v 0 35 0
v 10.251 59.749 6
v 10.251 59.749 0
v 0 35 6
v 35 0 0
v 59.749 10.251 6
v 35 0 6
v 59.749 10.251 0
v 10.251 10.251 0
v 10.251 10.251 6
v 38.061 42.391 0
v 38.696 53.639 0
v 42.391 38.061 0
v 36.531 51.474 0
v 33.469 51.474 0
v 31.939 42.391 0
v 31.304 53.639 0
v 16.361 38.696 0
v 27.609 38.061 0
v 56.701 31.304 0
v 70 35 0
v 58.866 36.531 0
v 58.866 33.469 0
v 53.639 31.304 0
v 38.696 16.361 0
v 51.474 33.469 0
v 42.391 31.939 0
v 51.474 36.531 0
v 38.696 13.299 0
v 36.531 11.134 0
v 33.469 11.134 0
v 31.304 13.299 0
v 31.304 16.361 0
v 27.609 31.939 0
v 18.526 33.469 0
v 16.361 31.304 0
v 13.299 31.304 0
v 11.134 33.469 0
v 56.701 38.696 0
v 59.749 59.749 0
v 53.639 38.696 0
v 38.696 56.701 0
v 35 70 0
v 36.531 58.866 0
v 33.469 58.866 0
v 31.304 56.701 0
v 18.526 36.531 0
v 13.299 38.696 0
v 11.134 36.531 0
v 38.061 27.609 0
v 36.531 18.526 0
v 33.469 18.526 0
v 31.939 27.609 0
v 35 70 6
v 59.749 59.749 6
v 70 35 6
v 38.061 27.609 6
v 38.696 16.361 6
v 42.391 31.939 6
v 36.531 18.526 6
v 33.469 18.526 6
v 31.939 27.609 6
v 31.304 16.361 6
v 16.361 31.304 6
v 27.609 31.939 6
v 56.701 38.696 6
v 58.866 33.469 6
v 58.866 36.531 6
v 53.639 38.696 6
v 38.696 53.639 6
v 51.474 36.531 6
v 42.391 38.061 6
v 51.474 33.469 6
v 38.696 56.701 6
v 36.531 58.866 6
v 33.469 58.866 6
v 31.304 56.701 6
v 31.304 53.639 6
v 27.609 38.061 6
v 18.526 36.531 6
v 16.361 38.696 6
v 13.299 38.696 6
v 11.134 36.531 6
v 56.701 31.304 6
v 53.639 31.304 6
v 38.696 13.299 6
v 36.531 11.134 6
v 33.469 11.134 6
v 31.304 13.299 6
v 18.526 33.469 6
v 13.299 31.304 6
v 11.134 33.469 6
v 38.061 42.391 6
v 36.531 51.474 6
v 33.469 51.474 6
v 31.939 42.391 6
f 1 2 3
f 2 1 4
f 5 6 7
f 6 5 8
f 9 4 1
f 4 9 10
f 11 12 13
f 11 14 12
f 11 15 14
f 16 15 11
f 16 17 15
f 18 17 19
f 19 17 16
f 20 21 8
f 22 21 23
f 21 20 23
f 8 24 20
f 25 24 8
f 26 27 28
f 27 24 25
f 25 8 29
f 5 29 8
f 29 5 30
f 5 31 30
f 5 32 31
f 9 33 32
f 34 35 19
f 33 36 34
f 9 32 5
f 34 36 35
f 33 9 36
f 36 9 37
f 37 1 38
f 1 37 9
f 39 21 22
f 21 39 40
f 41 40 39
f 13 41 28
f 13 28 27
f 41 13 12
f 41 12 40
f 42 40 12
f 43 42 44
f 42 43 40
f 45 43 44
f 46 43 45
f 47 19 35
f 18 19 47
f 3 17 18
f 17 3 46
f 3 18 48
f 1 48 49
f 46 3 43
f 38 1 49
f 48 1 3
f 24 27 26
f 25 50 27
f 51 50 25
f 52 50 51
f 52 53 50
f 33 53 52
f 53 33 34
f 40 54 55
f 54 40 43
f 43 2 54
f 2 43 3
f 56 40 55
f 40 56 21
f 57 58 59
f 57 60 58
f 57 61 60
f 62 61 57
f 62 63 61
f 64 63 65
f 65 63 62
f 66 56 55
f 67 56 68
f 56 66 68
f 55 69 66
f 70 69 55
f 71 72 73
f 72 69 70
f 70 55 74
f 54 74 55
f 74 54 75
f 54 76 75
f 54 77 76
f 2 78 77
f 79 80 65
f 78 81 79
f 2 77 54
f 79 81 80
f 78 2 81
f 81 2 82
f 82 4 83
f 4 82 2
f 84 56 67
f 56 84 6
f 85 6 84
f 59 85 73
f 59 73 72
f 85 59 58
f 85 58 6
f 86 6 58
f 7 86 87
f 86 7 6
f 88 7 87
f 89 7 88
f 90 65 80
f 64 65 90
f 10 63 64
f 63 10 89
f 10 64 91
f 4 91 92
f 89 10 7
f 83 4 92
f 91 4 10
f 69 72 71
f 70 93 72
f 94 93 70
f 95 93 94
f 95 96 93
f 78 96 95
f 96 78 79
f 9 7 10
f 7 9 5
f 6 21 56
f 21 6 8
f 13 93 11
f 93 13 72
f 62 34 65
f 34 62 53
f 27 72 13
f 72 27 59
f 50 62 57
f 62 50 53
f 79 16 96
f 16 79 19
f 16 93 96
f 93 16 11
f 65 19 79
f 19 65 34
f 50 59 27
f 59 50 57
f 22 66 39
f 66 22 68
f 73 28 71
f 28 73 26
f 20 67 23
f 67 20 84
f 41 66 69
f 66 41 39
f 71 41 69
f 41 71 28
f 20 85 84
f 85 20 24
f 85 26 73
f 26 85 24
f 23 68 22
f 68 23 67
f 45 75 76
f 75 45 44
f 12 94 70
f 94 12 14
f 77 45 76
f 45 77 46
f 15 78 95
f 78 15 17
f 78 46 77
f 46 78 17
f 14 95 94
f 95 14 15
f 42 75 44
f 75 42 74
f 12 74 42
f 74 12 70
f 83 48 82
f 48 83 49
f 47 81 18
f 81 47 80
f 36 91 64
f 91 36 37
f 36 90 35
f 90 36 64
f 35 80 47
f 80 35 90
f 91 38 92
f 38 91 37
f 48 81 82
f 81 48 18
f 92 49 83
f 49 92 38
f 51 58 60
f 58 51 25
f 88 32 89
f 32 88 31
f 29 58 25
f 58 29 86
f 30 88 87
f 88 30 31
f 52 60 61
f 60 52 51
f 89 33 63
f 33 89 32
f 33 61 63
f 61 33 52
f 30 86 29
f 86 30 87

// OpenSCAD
$fn = 32;

// ----------------------------------------------------------------------
// Polygon plate: 8-gon R35, 4 bolt windows
// ----------------------------------------------------------------------

// --- parameters (mm) ---
sides = 8;                // number of polygon sides
plate_r = 35;             // circumscribed radius of the polygon
bore_r = 8;               // centre bore radius
bolts = 4;                // number of bolt windows
ring_r = 20.17;           // bolt-circle radius
bolt_r = 4;               // bolt window radius
plate_t = 6;              // plate thickness, Z (extrusion height)

plate_d = 2 * plate_r;  // circumscribed diameter
bore_d = 2 * bore_r;  // centre bore diameter
bolt_d = 2 * bolt_r;  // bolt window diameter
ring_d = 2 * ring_r;  // bolt-circle diameter

profile = [[70, 35], [59.749, 59.749], [35, 70], [10.251, 59.749], [0, 35], [10.251, 10.251], [35, 0], [59.749, 10.251]];  // primary outline, 8 points, counter clockwise
void_1 = [[42.391, 38.061], [38.061, 42.391], [31.939, 42.391], [27.609, 38.061], [27.609, 31.939], [31.939, 27.609], [38.061, 27.609], [42.391, 31.939]];  // centre bore, 8 points
void_2 = [[58.866, 36.531], [56.701, 38.696], [53.639, 38.696], [51.474, 36.531], [51.474, 33.469], [53.639, 31.304], [56.701, 31.304], [58.866, 33.469]];  // bolt window 1, 8 points
void_3 = [[38.696, 56.701], [36.531, 58.866], [33.469, 58.866], [31.304, 56.701], [31.304, 53.639], [33.469, 51.474], [36.531, 51.474], [38.696, 53.639]];  // bolt window 2, 8 points
void_4 = [[18.526, 36.531], [16.361, 38.696], [13.299, 38.696], [11.134, 36.531], [11.134, 33.469], [13.299, 31.304], [16.361, 31.304], [18.526, 33.469]];  // bolt window 3, 8 points
void_5 = [[38.696, 16.361], [36.531, 18.526], [33.469, 18.526], [31.304, 16.361], [31.304, 13.299], [33.469, 11.134], [36.531, 11.134], [38.696, 13.299]];  // bolt window 4, 8 points

// --- the one profile operation ---
difference() {
  linear_extrude(height = plate_t) polygon(points = profile);
  translate([0, 0, -1])
    linear_extrude(height = plate_t + 2) polygon(points = void_1);
  translate([0, 0, -1])
    linear_extrude(height = plate_t + 2) polygon(points = void_2);
  translate([0, 0, -1])
    linear_extrude(height = plate_t + 2) polygon(points = void_3);
  translate([0, 0, -1])
    linear_extrude(height = plate_t + 2) polygon(points = void_4);
  translate([0, 0, -1])
    linear_extrude(height = plate_t + 2) polygon(points = void_5);
}
